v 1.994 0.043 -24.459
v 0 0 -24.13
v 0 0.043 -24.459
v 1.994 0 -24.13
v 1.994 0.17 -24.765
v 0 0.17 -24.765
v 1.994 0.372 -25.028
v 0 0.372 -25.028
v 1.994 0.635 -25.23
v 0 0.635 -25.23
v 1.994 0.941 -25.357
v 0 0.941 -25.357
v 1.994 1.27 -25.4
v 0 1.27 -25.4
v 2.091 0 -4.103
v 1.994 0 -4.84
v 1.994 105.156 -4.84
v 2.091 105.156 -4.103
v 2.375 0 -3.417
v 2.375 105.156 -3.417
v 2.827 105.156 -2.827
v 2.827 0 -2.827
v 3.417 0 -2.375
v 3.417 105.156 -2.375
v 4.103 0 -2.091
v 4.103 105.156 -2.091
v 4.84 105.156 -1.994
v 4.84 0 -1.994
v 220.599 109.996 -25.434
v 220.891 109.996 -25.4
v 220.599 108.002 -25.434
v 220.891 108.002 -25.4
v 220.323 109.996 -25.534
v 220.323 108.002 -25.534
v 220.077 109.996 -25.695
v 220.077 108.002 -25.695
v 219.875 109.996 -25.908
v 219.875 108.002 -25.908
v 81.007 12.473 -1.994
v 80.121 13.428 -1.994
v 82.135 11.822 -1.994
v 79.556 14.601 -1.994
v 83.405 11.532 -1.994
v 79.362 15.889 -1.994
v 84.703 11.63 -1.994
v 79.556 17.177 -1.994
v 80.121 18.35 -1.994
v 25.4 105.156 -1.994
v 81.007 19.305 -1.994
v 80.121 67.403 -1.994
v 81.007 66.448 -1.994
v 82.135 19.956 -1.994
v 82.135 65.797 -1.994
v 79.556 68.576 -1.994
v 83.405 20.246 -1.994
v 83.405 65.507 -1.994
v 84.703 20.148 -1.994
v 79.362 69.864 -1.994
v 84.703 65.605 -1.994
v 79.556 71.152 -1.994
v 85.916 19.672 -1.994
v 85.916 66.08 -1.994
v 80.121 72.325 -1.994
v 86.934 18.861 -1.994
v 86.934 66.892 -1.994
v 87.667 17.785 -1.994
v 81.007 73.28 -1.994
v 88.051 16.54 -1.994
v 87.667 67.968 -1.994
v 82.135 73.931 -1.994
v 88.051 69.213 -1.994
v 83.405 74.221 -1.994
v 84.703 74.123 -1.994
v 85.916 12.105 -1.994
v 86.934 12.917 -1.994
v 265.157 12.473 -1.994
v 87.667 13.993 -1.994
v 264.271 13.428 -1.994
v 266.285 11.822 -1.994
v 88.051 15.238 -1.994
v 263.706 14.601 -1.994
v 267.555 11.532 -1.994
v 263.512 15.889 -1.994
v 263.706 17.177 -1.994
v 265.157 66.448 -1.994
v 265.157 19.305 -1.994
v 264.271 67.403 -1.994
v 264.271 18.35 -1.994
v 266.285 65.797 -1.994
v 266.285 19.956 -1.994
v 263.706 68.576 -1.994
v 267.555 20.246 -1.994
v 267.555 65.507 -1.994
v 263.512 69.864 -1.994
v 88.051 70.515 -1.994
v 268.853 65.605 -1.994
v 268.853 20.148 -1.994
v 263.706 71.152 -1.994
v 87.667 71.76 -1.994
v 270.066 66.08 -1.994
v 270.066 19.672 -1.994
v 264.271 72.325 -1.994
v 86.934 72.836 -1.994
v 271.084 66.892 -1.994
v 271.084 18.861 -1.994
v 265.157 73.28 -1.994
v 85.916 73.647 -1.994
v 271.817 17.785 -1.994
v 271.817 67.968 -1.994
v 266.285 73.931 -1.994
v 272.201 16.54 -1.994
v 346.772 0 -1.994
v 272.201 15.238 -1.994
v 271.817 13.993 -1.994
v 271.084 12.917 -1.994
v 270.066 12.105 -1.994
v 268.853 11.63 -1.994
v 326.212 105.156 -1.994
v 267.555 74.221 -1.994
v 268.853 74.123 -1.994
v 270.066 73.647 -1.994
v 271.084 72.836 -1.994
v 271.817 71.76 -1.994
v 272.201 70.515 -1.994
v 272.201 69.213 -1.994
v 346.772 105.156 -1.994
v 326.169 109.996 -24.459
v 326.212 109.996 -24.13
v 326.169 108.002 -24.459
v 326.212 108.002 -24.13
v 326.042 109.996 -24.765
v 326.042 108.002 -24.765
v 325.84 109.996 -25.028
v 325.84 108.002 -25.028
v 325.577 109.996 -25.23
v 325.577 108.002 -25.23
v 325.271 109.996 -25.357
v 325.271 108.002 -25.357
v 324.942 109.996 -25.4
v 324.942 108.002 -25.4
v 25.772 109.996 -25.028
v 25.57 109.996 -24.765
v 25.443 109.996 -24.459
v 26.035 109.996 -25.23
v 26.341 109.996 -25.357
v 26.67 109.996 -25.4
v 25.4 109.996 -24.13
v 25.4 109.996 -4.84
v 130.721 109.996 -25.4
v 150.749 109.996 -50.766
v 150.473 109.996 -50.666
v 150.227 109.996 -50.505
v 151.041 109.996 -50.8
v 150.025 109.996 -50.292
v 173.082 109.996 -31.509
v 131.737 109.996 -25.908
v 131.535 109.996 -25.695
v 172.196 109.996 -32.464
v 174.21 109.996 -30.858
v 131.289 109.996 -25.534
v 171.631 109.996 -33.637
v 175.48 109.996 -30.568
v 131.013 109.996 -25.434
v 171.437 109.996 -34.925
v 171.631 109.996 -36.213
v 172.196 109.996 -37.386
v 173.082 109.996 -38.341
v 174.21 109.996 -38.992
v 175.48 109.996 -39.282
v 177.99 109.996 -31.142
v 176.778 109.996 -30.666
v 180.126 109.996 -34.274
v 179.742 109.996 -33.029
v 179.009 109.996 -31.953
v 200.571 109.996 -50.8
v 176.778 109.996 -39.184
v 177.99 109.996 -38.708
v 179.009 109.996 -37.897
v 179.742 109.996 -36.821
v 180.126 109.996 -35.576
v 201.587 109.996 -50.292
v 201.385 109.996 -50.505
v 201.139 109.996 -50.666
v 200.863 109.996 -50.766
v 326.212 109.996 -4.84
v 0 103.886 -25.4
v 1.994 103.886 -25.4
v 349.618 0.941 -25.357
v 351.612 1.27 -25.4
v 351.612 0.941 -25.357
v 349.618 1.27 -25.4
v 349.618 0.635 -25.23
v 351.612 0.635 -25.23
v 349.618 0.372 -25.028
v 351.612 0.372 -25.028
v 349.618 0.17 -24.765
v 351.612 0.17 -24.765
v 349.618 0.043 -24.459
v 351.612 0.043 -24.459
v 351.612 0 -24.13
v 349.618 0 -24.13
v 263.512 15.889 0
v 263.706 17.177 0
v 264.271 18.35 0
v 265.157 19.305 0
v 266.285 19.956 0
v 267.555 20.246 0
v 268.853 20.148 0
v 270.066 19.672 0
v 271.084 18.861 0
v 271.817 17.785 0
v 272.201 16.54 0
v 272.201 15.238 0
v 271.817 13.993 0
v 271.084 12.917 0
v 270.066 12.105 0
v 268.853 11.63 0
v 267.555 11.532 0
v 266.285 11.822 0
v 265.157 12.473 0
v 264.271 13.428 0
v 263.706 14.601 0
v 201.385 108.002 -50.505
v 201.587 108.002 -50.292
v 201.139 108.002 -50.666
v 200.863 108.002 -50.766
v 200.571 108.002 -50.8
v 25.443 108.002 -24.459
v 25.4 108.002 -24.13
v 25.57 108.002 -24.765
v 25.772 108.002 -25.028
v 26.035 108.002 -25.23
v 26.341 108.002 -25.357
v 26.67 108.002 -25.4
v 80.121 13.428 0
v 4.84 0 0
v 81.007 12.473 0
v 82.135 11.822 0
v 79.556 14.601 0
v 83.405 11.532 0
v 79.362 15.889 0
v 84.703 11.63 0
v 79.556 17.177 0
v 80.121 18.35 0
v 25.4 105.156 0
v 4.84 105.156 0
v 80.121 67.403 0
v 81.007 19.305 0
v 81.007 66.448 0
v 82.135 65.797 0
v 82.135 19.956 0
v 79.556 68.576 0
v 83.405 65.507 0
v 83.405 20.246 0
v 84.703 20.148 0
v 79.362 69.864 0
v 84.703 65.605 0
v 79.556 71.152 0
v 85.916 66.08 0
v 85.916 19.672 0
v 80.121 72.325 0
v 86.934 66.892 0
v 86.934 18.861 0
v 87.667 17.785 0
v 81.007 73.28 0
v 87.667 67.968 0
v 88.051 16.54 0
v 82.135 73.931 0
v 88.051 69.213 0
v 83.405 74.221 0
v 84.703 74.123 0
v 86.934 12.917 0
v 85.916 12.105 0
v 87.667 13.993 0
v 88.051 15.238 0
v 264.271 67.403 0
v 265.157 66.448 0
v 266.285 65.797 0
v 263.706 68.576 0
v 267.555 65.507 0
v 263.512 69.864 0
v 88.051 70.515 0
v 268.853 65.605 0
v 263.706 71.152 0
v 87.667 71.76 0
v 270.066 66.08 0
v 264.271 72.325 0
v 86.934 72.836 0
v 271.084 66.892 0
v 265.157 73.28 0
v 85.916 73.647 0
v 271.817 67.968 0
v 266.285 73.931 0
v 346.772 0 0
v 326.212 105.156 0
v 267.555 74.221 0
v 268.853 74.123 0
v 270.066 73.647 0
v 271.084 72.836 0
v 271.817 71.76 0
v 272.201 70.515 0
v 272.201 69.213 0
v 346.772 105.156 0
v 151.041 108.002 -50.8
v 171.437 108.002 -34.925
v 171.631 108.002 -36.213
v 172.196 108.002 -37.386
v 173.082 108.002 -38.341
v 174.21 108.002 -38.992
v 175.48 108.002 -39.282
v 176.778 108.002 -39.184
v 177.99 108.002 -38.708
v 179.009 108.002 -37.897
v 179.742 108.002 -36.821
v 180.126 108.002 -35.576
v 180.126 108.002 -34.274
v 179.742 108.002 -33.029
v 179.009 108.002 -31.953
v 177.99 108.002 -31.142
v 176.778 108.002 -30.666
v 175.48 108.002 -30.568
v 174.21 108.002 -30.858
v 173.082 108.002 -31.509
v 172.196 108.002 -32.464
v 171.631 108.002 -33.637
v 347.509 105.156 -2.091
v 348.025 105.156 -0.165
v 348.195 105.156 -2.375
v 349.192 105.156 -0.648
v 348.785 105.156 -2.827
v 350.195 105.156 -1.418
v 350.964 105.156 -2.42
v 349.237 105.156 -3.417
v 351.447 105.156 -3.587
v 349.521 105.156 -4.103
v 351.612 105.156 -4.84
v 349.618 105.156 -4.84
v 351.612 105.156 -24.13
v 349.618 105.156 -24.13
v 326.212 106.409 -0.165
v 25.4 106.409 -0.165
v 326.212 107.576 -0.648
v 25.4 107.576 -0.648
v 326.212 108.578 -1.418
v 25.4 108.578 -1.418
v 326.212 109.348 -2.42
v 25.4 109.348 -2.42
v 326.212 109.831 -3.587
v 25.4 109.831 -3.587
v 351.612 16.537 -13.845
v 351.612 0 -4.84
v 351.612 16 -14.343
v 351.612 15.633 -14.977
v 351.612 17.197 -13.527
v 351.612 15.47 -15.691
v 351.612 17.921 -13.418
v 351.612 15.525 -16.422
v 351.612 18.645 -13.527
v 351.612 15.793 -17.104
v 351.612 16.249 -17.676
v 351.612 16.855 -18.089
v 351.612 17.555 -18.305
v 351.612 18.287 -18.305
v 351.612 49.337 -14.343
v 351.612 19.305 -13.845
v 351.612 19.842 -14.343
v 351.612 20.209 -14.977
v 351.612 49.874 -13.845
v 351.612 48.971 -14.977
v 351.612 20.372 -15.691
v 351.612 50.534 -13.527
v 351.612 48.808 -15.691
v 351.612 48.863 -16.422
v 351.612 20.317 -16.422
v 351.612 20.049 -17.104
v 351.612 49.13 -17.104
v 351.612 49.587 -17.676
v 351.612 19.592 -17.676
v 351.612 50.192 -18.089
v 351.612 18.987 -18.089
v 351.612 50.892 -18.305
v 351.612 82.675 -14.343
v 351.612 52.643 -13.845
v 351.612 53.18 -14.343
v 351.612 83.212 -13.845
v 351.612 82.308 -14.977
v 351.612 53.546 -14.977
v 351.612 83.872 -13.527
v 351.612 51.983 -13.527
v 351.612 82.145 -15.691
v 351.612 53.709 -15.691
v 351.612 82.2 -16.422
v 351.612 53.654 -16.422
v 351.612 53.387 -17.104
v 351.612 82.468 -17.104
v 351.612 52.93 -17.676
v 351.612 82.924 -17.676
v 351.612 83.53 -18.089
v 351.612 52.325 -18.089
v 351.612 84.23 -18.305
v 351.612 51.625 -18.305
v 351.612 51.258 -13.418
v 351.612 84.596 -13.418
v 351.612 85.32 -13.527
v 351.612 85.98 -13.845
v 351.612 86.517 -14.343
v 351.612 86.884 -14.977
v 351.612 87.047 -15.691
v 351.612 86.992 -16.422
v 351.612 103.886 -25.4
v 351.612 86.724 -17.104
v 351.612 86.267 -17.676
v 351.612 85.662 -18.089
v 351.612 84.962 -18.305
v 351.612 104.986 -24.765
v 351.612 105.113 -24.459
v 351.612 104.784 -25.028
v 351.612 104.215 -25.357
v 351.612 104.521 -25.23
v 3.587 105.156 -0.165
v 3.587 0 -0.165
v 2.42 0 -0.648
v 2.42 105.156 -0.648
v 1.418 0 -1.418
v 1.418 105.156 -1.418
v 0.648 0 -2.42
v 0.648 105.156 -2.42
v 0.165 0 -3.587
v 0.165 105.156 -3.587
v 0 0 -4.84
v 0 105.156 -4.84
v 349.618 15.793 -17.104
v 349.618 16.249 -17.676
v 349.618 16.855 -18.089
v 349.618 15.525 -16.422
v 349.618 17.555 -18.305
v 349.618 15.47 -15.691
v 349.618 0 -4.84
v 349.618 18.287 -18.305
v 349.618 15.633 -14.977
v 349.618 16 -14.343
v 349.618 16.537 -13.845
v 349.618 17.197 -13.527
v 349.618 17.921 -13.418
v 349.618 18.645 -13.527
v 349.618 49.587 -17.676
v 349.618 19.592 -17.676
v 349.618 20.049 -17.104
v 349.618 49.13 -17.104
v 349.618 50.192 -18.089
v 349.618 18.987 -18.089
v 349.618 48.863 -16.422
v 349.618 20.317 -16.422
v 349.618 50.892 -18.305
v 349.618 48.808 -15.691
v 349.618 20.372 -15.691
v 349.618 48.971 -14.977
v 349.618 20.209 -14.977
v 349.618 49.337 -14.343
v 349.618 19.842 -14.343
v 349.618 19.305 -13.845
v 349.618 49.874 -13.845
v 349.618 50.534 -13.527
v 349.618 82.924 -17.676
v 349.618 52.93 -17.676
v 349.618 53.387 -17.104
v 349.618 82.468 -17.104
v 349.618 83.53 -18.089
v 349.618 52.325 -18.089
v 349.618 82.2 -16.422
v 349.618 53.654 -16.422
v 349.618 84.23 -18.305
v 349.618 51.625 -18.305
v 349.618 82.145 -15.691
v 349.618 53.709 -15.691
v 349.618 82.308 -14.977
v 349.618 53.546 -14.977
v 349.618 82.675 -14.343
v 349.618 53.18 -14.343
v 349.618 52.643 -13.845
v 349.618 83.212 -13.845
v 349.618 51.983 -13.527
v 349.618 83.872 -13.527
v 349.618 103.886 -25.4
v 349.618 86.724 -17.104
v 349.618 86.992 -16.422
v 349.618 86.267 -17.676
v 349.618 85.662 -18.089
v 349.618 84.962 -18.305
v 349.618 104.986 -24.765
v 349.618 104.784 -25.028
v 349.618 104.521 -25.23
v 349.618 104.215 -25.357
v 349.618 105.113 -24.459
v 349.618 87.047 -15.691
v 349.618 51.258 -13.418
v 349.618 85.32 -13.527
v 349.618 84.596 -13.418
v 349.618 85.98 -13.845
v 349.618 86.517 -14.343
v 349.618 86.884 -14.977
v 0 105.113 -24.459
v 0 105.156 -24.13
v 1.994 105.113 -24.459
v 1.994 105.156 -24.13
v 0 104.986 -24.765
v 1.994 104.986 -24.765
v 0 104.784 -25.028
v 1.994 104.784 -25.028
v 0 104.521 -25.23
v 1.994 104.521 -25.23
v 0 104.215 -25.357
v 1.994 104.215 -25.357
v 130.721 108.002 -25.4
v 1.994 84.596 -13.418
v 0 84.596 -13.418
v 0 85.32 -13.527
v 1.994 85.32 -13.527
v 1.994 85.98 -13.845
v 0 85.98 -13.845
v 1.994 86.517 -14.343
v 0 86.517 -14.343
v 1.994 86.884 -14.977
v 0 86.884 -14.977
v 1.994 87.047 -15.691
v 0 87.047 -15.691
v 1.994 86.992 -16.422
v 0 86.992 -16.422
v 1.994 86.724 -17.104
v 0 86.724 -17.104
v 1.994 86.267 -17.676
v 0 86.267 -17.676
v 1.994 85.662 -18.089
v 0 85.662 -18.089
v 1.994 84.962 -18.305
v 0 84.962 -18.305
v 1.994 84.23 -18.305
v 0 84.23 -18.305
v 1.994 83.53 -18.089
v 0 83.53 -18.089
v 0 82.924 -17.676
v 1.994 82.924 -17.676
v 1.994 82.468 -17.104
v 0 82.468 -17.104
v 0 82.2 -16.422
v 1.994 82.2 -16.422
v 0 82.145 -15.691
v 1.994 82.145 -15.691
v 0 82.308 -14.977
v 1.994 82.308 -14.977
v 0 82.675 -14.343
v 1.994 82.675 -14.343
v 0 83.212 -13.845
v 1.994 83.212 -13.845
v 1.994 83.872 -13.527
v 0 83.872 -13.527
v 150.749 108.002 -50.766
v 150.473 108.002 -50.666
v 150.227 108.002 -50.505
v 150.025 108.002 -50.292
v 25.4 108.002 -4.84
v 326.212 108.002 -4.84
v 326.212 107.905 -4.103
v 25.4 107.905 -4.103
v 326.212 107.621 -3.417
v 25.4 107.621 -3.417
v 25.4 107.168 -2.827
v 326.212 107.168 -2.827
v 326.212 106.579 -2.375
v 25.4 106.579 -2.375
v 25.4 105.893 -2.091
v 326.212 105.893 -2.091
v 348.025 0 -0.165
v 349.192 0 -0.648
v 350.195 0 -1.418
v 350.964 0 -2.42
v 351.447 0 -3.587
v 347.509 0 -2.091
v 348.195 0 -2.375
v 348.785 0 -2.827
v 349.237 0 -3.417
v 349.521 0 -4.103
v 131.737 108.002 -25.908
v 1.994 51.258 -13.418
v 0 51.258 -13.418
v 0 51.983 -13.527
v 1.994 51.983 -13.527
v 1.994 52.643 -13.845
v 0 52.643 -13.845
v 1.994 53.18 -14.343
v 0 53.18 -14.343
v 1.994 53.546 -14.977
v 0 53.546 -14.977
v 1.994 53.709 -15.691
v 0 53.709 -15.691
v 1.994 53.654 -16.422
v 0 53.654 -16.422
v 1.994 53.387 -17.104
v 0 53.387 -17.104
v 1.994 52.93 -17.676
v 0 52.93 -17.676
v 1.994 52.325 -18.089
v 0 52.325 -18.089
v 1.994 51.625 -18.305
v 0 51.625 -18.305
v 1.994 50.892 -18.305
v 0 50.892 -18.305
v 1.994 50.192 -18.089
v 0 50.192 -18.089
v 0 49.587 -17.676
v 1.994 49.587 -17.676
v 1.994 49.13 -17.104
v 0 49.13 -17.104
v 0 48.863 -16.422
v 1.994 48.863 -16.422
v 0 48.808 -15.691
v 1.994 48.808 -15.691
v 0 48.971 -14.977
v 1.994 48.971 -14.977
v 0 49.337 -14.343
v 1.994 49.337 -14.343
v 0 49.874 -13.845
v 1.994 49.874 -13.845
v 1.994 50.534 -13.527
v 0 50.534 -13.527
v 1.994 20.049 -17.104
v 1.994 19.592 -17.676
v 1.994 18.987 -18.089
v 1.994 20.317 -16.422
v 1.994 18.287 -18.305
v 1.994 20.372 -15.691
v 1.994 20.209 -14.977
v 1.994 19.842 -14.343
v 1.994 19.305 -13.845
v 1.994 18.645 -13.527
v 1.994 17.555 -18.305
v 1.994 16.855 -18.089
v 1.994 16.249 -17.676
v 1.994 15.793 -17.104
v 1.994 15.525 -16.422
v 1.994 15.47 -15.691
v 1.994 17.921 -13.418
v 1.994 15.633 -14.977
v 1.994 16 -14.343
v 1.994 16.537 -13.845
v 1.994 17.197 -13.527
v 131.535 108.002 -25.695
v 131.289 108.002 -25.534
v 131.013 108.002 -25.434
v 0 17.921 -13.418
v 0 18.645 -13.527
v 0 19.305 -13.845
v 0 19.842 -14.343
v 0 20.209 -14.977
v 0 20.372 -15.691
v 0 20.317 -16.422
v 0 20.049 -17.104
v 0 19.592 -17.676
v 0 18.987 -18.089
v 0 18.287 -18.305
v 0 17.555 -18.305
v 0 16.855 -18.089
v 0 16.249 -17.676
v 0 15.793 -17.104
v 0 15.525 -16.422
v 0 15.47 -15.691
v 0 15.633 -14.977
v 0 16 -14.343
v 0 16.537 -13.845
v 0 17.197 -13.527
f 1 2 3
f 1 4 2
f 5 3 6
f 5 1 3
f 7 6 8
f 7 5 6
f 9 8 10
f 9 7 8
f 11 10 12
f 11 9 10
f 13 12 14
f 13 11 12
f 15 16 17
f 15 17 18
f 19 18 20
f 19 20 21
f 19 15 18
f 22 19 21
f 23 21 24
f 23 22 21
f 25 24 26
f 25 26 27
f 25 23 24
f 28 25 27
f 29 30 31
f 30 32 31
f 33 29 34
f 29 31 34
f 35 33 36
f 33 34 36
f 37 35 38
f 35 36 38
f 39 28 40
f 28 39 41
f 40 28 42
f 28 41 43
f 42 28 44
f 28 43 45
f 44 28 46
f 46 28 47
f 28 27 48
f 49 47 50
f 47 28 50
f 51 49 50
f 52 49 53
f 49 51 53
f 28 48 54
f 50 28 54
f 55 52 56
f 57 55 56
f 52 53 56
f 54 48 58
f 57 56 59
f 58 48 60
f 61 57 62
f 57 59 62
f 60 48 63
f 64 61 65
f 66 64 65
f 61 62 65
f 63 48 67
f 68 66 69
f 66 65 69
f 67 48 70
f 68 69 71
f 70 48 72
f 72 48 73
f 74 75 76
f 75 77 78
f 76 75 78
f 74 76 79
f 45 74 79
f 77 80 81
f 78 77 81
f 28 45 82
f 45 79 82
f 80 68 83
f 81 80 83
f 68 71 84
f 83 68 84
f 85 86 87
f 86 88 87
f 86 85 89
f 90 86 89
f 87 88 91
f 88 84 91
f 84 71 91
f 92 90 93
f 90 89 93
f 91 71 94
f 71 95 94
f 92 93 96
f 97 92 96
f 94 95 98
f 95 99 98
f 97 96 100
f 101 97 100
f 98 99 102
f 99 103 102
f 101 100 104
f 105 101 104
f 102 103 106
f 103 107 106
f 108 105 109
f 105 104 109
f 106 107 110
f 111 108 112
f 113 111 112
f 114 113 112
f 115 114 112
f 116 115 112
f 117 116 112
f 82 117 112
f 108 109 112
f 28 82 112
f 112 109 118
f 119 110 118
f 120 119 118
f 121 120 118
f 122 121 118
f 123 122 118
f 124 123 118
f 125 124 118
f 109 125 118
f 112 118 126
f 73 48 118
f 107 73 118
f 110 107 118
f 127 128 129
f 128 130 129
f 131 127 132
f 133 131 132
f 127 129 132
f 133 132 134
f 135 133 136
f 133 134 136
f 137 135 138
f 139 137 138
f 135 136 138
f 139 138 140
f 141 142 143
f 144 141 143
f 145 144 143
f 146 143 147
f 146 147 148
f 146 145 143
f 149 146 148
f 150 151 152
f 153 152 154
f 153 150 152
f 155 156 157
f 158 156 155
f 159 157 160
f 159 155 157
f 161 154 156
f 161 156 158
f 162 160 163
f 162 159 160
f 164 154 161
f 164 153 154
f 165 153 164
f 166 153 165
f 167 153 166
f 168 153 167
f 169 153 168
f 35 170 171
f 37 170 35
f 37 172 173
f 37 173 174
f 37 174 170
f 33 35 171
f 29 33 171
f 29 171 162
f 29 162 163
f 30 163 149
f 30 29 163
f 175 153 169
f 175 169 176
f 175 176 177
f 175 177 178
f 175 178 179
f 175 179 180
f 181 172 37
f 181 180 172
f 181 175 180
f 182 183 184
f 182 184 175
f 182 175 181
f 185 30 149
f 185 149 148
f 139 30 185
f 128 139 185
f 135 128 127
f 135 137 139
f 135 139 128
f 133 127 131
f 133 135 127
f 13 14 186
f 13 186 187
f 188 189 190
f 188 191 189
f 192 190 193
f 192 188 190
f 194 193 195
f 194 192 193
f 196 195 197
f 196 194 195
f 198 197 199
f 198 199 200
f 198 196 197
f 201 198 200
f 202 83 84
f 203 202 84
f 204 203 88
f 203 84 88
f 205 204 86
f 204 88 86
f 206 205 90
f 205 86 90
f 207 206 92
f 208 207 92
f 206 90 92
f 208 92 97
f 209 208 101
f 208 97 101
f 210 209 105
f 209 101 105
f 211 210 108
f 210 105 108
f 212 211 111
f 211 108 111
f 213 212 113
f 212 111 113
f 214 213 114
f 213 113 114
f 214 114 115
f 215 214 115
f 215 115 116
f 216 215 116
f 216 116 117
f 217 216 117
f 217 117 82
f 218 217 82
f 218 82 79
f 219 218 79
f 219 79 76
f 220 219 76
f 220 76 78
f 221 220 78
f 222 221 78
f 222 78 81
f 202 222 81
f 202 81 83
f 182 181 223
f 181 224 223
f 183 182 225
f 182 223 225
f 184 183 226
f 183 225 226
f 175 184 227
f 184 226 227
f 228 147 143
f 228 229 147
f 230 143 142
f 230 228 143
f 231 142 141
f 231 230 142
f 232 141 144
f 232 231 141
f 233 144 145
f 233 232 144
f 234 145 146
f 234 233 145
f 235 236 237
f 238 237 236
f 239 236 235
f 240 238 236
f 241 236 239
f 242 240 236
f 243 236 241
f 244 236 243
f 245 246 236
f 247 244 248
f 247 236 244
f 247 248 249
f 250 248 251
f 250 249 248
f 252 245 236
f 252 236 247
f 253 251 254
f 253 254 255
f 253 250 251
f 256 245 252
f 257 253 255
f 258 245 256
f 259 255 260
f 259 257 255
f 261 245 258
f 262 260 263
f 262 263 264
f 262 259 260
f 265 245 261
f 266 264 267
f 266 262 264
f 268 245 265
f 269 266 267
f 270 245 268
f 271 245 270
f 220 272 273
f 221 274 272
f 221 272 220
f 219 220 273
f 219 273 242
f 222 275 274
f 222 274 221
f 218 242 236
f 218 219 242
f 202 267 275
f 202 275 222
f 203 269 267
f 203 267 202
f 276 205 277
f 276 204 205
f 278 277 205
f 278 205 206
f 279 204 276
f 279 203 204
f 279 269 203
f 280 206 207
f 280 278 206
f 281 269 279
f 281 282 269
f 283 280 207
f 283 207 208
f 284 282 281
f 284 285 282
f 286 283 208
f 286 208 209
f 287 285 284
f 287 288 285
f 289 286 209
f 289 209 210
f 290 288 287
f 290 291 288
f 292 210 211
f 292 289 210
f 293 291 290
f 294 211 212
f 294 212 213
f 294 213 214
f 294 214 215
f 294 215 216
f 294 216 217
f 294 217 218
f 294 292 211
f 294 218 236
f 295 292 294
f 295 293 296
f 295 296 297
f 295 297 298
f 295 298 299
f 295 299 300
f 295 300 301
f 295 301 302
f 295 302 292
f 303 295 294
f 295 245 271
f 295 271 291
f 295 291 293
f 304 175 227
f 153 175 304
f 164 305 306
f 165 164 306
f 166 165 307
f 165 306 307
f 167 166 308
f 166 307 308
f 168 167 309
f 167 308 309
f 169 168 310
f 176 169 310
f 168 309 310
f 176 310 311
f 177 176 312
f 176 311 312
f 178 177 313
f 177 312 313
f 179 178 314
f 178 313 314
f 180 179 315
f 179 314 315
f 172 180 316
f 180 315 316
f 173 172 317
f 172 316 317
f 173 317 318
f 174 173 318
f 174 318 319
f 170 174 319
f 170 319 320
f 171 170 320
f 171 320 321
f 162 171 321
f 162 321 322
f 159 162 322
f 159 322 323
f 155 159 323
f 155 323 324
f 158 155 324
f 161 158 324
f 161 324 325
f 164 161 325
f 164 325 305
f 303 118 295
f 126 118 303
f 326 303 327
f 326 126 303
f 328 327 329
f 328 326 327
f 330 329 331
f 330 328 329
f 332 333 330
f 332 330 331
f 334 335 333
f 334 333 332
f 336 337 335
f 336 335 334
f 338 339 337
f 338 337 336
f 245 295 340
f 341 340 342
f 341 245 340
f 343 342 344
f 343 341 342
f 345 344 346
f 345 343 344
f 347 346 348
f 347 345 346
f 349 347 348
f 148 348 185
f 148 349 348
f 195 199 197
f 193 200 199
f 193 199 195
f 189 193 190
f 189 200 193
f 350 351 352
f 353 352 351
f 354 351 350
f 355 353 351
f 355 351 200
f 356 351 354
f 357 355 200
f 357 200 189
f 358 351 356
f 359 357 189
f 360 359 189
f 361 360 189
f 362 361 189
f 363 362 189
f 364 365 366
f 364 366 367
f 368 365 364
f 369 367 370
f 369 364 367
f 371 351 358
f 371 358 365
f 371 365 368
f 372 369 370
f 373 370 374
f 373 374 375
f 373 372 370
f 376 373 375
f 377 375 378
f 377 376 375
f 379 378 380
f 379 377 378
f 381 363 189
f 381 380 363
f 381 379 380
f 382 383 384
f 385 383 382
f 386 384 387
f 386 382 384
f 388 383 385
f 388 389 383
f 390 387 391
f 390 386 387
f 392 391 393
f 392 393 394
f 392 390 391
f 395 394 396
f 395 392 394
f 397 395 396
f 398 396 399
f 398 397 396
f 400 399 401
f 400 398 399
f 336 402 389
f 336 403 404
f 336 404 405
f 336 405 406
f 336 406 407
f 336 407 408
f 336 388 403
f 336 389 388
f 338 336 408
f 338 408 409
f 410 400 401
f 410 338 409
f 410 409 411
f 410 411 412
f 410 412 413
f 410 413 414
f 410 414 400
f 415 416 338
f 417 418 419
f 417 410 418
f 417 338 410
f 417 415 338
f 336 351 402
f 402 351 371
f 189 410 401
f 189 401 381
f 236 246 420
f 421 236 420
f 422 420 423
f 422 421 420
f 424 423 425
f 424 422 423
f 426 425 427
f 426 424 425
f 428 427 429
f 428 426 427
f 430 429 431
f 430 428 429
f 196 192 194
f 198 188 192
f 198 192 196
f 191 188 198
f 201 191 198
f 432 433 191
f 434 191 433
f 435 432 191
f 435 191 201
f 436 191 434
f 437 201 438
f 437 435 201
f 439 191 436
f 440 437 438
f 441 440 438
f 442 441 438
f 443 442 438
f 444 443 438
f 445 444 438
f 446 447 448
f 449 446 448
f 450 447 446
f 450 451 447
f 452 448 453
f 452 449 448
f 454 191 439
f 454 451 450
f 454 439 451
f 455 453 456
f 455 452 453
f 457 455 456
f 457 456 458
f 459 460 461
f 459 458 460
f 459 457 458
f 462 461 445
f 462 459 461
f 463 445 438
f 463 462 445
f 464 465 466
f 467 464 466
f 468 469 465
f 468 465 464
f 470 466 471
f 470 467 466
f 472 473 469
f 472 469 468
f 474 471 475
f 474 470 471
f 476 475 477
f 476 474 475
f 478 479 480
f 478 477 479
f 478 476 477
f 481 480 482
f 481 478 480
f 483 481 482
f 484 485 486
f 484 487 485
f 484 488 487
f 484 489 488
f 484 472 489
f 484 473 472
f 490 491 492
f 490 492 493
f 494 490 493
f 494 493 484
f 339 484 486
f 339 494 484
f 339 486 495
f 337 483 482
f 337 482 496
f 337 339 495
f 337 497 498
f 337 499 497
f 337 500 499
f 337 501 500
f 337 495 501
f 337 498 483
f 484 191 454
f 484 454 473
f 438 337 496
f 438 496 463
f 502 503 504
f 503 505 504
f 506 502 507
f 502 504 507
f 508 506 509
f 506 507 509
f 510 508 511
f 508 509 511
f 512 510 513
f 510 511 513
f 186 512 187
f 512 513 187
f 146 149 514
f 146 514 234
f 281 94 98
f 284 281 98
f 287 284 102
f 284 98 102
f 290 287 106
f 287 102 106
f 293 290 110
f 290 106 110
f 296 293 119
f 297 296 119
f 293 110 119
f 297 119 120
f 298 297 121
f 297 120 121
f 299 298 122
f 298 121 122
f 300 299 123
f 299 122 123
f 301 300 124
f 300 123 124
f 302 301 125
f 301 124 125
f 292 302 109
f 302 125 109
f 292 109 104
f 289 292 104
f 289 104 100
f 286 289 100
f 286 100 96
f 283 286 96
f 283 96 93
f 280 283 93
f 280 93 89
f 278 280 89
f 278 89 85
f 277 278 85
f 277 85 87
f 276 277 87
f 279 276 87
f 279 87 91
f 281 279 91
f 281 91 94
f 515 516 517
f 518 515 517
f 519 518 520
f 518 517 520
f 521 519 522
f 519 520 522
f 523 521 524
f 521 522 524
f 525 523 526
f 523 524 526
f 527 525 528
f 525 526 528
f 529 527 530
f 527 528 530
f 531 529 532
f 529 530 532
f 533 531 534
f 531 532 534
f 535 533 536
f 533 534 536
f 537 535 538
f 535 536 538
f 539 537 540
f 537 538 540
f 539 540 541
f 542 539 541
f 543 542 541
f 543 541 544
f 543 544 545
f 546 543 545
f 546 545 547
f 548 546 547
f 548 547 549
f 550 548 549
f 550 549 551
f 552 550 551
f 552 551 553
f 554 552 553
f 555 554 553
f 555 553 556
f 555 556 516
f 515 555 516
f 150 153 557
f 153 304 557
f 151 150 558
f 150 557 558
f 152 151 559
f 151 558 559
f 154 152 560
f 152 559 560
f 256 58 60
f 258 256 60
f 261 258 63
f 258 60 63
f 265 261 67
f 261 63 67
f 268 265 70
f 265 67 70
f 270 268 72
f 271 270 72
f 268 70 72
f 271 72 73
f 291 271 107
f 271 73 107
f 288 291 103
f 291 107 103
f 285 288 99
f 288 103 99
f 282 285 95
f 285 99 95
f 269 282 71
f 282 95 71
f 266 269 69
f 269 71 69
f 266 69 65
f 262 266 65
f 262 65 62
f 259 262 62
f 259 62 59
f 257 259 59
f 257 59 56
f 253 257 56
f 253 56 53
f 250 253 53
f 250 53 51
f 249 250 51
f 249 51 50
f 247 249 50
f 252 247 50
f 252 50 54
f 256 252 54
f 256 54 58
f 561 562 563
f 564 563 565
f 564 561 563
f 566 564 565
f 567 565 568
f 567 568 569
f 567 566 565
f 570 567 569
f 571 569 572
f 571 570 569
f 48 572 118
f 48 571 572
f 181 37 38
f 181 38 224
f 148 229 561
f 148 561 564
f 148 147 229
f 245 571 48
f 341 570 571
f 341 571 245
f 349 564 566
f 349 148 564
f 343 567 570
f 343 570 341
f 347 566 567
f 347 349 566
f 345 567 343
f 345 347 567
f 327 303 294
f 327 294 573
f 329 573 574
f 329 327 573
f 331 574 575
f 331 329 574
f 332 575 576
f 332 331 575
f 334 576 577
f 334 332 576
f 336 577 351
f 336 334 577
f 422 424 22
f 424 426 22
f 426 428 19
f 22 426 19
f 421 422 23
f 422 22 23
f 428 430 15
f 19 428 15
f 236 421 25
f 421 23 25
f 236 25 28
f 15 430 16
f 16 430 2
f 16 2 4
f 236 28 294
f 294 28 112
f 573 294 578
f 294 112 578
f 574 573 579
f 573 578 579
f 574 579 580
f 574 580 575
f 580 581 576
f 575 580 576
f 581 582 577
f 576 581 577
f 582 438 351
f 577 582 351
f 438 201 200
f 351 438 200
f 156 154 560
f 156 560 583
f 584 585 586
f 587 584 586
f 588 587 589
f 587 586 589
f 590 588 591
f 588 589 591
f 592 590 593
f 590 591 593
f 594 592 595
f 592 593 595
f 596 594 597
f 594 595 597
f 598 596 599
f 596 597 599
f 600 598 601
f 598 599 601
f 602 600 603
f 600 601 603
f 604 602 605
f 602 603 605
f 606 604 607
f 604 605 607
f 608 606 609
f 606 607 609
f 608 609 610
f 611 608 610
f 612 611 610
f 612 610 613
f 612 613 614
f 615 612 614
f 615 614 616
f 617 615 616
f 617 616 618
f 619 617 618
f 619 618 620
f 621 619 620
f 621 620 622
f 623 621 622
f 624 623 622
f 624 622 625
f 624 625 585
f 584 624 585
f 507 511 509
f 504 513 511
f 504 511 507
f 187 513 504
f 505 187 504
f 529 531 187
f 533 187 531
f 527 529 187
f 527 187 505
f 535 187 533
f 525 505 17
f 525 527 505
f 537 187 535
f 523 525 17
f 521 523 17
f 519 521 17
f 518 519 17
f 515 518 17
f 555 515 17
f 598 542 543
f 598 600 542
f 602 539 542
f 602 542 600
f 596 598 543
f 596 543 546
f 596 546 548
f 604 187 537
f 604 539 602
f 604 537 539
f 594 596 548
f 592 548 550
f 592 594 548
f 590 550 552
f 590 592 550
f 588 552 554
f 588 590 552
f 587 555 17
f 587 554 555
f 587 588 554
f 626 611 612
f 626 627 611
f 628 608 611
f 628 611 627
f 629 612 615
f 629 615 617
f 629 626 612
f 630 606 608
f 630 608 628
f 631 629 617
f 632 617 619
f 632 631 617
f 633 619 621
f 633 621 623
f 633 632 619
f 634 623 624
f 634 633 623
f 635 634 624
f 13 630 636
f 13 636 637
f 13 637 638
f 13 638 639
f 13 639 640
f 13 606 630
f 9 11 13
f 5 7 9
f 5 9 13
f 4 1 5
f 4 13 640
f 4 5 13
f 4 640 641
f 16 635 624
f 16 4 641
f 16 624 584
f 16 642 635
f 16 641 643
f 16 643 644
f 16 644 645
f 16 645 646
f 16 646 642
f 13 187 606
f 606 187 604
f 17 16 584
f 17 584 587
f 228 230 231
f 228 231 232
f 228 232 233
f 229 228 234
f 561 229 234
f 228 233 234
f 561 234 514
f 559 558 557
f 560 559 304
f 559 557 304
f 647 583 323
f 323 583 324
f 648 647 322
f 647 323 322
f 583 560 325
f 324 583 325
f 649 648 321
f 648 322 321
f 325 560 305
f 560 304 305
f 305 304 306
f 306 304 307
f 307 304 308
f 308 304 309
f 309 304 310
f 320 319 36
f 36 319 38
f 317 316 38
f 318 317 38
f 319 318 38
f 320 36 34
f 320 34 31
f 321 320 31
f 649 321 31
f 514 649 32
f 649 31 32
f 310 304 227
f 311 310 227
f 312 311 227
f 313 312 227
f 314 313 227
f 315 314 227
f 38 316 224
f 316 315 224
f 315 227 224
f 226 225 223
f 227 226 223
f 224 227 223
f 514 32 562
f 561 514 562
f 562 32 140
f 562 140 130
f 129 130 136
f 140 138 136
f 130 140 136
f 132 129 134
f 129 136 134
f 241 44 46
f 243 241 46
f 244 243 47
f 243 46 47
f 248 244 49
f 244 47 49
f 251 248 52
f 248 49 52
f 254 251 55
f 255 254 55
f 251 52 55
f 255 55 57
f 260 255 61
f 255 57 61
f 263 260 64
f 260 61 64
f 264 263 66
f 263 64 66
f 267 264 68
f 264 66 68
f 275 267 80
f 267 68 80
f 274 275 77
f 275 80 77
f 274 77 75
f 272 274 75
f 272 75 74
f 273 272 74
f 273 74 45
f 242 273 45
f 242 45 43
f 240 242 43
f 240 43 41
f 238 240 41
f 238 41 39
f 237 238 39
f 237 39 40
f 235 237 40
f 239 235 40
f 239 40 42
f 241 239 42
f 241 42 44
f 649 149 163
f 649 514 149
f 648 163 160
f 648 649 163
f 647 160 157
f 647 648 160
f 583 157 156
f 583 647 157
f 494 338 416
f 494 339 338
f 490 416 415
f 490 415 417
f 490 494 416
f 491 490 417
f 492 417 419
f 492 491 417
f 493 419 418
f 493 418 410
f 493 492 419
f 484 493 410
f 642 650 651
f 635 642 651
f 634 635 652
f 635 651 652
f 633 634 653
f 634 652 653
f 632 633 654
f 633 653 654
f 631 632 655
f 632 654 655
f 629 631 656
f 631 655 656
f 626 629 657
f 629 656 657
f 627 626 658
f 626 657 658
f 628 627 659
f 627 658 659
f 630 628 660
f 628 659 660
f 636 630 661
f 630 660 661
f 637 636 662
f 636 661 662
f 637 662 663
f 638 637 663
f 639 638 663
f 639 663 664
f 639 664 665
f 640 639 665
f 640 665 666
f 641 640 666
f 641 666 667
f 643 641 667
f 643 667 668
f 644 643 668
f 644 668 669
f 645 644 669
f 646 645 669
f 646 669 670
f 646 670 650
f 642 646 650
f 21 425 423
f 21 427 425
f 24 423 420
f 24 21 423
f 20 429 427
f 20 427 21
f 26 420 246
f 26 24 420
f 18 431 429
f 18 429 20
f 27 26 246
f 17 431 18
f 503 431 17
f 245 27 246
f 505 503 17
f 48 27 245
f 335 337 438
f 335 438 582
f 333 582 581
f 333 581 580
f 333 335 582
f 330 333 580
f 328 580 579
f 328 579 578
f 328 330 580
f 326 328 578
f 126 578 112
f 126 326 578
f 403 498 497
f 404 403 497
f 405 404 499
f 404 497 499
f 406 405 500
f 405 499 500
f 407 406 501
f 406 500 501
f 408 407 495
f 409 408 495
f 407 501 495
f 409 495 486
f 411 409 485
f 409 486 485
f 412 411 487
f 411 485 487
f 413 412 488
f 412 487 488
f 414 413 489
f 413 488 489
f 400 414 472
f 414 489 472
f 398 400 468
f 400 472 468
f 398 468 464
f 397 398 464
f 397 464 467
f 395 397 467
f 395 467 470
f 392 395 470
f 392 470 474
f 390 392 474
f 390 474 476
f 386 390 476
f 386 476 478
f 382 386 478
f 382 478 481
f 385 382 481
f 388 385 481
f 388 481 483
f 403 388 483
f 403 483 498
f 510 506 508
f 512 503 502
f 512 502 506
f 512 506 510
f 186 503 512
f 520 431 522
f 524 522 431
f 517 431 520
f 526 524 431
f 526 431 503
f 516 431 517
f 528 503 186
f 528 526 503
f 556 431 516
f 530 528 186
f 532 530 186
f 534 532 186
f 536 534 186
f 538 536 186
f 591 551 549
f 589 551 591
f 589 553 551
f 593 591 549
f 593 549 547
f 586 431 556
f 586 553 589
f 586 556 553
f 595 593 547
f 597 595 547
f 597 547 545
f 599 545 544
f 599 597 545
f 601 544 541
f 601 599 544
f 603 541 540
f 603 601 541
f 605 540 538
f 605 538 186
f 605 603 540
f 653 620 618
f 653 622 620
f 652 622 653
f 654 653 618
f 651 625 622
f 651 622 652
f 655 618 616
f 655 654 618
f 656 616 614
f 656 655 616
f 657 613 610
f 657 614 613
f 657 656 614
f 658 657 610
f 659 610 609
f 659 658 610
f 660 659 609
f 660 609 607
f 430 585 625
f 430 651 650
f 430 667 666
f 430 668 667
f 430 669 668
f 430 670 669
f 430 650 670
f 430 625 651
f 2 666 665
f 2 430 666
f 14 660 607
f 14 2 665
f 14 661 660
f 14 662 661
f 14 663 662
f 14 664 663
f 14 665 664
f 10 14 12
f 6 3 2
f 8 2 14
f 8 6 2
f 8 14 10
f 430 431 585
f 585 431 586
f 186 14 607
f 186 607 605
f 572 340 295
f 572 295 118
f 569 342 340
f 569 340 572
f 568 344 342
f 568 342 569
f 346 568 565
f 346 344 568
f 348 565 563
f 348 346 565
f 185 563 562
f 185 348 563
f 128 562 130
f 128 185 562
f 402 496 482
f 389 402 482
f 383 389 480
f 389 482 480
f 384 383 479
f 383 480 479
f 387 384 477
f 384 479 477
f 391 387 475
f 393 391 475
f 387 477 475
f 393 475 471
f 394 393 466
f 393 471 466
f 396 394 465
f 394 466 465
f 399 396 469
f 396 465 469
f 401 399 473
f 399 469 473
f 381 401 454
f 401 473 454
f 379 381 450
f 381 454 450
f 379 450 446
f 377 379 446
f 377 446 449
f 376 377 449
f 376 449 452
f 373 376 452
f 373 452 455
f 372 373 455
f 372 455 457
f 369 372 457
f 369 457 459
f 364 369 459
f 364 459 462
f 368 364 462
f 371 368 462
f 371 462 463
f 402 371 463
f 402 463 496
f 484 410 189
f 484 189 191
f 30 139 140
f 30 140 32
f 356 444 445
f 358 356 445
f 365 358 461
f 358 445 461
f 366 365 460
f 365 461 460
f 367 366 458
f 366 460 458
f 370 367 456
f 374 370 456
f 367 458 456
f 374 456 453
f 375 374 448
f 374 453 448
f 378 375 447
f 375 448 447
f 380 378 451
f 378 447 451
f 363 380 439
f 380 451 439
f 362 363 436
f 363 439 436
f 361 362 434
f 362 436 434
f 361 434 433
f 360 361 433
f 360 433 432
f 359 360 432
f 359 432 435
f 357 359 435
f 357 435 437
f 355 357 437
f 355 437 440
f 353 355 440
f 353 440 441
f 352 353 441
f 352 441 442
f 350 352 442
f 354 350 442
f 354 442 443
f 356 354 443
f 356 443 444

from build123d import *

# Parameters (mm, degrees)
SKETCH1_W                                 = 351.6122
SKETCH1_H                                 = 105.156
BASE_FLANGE1_DEPTH                        = 1.9939
EDGE_FLANGE1_STRIP_W                      = 13.66774
EDGE_FLANGE1_STRIP_H                      = 1.9939
EDGE_FLANGE1_STRIP_CUT_DEPTH              = 105.156
EDGE_FLANGE1_STRIP_2_W                    = 13.66774
EDGE_FLANGE1_STRIP_2_H                    = 1.9939
EDGE_FLANGE1_STRIP_CUT_2_DEPTH            = 105.156
EDGE_FLANGE1_DEPTH                        = 105.156
EDGE_FLANGE1_BEND_DEPTH                   = 105.156
EDGE_FLANGE2_DEPTH                        = 300.8122
EDGE_FLANGE2_START                        = 1.9939
EDGE_FLANGE2_FLAT_DEPTH                   = 1.9939
F_0_221_DIAMETER_HOLE1_D                  = 4.9149
HOLE_FOR_1_4_SELF_CLINCHING_NUTS_S_SS_C_D = 8.7376
HOLE_FOR_1_4_SELF_CLINCHING_NUTS_S_2_D    = 8.7376
FILLET1_R                                 = 1.27


# Sheet-metal steps are written as plain solids
with BuildPart() as part:
    # Sketch1 → Base-Flange1 (new body)
    with BuildSketch(Plane.XY):
        with Locations((175.8061, 52.578)):
            Rectangle(SKETCH1_W, SKETCH1_H)
    extrude(amount=-BASE_FLANGE1_DEPTH)

    # Edge-Flange1 strip (across the edge) → Edge-Flange1 strip cut (cut)
    with BuildSketch(Plane(origin=(0, 0, -1.9939), x_dir=(1, 0, 0), z_dir=(0, 1, 0))):
        with Locations((-1.9939, -0.99695)):
            Rectangle(EDGE_FLANGE1_STRIP_W, EDGE_FLANGE1_STRIP_H)
    extrude(amount=EDGE_FLANGE1_STRIP_CUT_DEPTH, mode=Mode.SUBTRACT)

    # Edge-Flange1 strip 2 (across the edge) → Edge-Flange1 strip cut 2 (cut)
    with BuildSketch(Plane(origin=(351.6122, 105.156, -1.9939), x_dir=(-1, 0, 0), z_dir=(0, -1, 0))):
        with Locations((-1.9939, -0.99695)):
            Rectangle(EDGE_FLANGE1_STRIP_2_W, EDGE_FLANGE1_STRIP_2_H)
    extrude(amount=EDGE_FLANGE1_STRIP_CUT_2_DEPTH, mode=Mode.SUBTRACT)

    # Edge-Flange1 section (across the edge) → Edge-Flange1 (add)
    with BuildSketch(Plane(origin=(0, 0, -1.9939), x_dir=(1, 0, 0), z_dir=(0, 1, 0))):
        with BuildLine():
            Line((0, 2.84607), (0, 23.4061))
            Line((0, 23.4061), (1.9939, 23.4061))
            Line((1.9939, 23.4061), (1.9939, 2.84607))
            ThreePointArc((1.9939, 2.84607), (2.827494603, 0.833594603), (4.83997, 0))
            Line((4.83997, 0), (4.83997, -1.9939))
            ThreePointArc((4.83997, -1.9939), (1.417594392, -0.576305608), (0, 2.84607))
        make_face()
    extrude(amount=EDGE_FLANGE1_DEPTH)

    # Edge-Flange1 section 2 (across the edge) → Edge-Flange1 bend (add)
    with BuildSketch(Plane(origin=(351.6122, 105.156, -1.9939), x_dir=(-1, 0, 0), z_dir=(0, -1, 0))):
        with BuildLine():
            Line((0, 2.84607), (0, 23.4061))
            Line((0, 23.4061), (1.9939, 23.4061))
            Line((1.9939, 23.4061), (1.9939, 2.84607))
            ThreePointArc((1.9939, 2.84607), (2.827494603, 0.833594603), (4.83997, 0))
            Line((4.83997, 0), (4.83997, -1.9939))
            ThreePointArc((4.83997, -1.9939), (1.417594392, -0.576305608), (0, 2.84607))
        make_face()
    extrude(amount=EDGE_FLANGE1_BEND_DEPTH)

    # Edge-Flange2 bend section (across the edge) → Edge-Flange2 (add)
    with BuildSketch(Plane(origin=(25.4, 108.00207, -1.9939), x_dir=(0, -1, 0), z_dir=(1, 0, 0))):
        with BuildLine():
            Line((-1.9939, 2.84607), (0, 2.84607))
            ThreePointArc((0, 2.84607), (0.833594603, 0.833594603), (2.84607, 0))
            Line((2.84607, 0), (2.84607, -1.9939))
            ThreePointArc((2.84607, -1.9939), (-0.576305608, -0.576305608), (-1.9939, 2.84607))
        make_face()
    extrude(amount=EDGE_FLANGE2_DEPTH)

    # Edge-Flange2 profile (on flange) → Edge-Flange2 flat (add)
    with BuildSketch(Plane(origin=(0, 108.00207, -1.9939), x_dir=(1, 0, 0), z_dir=(0, 1, 0)).offset(EDGE_FLANGE2_START)):
        Polygon((326.2122, 2.84607), (326.2122, 23.4061), (220.2561, 23.4061), (201.2061, 48.8061), (150.4061, 48.8061), (131.3561, 23.4061), (25.4, 23.4061), (25.4, 2.84607), align=None)
    extrude(amount=-EDGE_FLANGE2_FLAT_DEPTH)

    # 0.221_ Diameter Hole1 (through all)
    with Locations(Plane(origin=(351.6122, 0, 0), x_dir=(0, 0, -1), z_dir=(1, 0, 0))):
        with Locations((15.875, 84.59597), (15.875, 17.92097), (15.875, 51.25847)):
            Hole(F_0_221_DIAMETER_HOLE1_D / 2)

    # Hole for 1_4 Self-clinching Nuts _S_SS_C (through all)
    with Locations(Plane(origin=(0, 109.99597, 0), x_dir=(1, 0, 0), z_dir=(0, 1, 0))):
        with Locations((175.8061, 34.925)):
            Hole(HOLE_FOR_1_4_SELF_CLINCHING_NUTS_S_SS_C_D / 2)

    # Hole for 1_4 Self-clinching Nuts _S_ 2 (through all)
    with Locations(Plane.XY):
        with Locations((83.7311, 69.86397), (83.7311, 15.88897), (267.8811, 15.88897), (267.8811, 69.86397)):
            Hole(HOLE_FOR_1_4_SELF_CLINCHING_NUTS_S_2_D / 2)

    # Fillet1
    fillet1_edges = [part.edges().sort_by_distance(p)[0] for p in [
        (0.99695, 0, -25.4),
        (0.99695, 105.156, -25.4),
        (350.61525, 105.156, -25.4),
        (350.61525, 0, -25.4),
        (25.4, 108.99902, -25.4),
        (326.2122, 108.99902, -25.4),
        (220.2561, 108.99902, -25.4),
        (201.2061, 108.99902, -50.8),
        (150.4061, 108.99902, -50.8),
        (131.3561, 108.99902, -25.4),
    ]]
    fillet(fillet1_edges, radius=FILLET1_R)


solid = part.part
